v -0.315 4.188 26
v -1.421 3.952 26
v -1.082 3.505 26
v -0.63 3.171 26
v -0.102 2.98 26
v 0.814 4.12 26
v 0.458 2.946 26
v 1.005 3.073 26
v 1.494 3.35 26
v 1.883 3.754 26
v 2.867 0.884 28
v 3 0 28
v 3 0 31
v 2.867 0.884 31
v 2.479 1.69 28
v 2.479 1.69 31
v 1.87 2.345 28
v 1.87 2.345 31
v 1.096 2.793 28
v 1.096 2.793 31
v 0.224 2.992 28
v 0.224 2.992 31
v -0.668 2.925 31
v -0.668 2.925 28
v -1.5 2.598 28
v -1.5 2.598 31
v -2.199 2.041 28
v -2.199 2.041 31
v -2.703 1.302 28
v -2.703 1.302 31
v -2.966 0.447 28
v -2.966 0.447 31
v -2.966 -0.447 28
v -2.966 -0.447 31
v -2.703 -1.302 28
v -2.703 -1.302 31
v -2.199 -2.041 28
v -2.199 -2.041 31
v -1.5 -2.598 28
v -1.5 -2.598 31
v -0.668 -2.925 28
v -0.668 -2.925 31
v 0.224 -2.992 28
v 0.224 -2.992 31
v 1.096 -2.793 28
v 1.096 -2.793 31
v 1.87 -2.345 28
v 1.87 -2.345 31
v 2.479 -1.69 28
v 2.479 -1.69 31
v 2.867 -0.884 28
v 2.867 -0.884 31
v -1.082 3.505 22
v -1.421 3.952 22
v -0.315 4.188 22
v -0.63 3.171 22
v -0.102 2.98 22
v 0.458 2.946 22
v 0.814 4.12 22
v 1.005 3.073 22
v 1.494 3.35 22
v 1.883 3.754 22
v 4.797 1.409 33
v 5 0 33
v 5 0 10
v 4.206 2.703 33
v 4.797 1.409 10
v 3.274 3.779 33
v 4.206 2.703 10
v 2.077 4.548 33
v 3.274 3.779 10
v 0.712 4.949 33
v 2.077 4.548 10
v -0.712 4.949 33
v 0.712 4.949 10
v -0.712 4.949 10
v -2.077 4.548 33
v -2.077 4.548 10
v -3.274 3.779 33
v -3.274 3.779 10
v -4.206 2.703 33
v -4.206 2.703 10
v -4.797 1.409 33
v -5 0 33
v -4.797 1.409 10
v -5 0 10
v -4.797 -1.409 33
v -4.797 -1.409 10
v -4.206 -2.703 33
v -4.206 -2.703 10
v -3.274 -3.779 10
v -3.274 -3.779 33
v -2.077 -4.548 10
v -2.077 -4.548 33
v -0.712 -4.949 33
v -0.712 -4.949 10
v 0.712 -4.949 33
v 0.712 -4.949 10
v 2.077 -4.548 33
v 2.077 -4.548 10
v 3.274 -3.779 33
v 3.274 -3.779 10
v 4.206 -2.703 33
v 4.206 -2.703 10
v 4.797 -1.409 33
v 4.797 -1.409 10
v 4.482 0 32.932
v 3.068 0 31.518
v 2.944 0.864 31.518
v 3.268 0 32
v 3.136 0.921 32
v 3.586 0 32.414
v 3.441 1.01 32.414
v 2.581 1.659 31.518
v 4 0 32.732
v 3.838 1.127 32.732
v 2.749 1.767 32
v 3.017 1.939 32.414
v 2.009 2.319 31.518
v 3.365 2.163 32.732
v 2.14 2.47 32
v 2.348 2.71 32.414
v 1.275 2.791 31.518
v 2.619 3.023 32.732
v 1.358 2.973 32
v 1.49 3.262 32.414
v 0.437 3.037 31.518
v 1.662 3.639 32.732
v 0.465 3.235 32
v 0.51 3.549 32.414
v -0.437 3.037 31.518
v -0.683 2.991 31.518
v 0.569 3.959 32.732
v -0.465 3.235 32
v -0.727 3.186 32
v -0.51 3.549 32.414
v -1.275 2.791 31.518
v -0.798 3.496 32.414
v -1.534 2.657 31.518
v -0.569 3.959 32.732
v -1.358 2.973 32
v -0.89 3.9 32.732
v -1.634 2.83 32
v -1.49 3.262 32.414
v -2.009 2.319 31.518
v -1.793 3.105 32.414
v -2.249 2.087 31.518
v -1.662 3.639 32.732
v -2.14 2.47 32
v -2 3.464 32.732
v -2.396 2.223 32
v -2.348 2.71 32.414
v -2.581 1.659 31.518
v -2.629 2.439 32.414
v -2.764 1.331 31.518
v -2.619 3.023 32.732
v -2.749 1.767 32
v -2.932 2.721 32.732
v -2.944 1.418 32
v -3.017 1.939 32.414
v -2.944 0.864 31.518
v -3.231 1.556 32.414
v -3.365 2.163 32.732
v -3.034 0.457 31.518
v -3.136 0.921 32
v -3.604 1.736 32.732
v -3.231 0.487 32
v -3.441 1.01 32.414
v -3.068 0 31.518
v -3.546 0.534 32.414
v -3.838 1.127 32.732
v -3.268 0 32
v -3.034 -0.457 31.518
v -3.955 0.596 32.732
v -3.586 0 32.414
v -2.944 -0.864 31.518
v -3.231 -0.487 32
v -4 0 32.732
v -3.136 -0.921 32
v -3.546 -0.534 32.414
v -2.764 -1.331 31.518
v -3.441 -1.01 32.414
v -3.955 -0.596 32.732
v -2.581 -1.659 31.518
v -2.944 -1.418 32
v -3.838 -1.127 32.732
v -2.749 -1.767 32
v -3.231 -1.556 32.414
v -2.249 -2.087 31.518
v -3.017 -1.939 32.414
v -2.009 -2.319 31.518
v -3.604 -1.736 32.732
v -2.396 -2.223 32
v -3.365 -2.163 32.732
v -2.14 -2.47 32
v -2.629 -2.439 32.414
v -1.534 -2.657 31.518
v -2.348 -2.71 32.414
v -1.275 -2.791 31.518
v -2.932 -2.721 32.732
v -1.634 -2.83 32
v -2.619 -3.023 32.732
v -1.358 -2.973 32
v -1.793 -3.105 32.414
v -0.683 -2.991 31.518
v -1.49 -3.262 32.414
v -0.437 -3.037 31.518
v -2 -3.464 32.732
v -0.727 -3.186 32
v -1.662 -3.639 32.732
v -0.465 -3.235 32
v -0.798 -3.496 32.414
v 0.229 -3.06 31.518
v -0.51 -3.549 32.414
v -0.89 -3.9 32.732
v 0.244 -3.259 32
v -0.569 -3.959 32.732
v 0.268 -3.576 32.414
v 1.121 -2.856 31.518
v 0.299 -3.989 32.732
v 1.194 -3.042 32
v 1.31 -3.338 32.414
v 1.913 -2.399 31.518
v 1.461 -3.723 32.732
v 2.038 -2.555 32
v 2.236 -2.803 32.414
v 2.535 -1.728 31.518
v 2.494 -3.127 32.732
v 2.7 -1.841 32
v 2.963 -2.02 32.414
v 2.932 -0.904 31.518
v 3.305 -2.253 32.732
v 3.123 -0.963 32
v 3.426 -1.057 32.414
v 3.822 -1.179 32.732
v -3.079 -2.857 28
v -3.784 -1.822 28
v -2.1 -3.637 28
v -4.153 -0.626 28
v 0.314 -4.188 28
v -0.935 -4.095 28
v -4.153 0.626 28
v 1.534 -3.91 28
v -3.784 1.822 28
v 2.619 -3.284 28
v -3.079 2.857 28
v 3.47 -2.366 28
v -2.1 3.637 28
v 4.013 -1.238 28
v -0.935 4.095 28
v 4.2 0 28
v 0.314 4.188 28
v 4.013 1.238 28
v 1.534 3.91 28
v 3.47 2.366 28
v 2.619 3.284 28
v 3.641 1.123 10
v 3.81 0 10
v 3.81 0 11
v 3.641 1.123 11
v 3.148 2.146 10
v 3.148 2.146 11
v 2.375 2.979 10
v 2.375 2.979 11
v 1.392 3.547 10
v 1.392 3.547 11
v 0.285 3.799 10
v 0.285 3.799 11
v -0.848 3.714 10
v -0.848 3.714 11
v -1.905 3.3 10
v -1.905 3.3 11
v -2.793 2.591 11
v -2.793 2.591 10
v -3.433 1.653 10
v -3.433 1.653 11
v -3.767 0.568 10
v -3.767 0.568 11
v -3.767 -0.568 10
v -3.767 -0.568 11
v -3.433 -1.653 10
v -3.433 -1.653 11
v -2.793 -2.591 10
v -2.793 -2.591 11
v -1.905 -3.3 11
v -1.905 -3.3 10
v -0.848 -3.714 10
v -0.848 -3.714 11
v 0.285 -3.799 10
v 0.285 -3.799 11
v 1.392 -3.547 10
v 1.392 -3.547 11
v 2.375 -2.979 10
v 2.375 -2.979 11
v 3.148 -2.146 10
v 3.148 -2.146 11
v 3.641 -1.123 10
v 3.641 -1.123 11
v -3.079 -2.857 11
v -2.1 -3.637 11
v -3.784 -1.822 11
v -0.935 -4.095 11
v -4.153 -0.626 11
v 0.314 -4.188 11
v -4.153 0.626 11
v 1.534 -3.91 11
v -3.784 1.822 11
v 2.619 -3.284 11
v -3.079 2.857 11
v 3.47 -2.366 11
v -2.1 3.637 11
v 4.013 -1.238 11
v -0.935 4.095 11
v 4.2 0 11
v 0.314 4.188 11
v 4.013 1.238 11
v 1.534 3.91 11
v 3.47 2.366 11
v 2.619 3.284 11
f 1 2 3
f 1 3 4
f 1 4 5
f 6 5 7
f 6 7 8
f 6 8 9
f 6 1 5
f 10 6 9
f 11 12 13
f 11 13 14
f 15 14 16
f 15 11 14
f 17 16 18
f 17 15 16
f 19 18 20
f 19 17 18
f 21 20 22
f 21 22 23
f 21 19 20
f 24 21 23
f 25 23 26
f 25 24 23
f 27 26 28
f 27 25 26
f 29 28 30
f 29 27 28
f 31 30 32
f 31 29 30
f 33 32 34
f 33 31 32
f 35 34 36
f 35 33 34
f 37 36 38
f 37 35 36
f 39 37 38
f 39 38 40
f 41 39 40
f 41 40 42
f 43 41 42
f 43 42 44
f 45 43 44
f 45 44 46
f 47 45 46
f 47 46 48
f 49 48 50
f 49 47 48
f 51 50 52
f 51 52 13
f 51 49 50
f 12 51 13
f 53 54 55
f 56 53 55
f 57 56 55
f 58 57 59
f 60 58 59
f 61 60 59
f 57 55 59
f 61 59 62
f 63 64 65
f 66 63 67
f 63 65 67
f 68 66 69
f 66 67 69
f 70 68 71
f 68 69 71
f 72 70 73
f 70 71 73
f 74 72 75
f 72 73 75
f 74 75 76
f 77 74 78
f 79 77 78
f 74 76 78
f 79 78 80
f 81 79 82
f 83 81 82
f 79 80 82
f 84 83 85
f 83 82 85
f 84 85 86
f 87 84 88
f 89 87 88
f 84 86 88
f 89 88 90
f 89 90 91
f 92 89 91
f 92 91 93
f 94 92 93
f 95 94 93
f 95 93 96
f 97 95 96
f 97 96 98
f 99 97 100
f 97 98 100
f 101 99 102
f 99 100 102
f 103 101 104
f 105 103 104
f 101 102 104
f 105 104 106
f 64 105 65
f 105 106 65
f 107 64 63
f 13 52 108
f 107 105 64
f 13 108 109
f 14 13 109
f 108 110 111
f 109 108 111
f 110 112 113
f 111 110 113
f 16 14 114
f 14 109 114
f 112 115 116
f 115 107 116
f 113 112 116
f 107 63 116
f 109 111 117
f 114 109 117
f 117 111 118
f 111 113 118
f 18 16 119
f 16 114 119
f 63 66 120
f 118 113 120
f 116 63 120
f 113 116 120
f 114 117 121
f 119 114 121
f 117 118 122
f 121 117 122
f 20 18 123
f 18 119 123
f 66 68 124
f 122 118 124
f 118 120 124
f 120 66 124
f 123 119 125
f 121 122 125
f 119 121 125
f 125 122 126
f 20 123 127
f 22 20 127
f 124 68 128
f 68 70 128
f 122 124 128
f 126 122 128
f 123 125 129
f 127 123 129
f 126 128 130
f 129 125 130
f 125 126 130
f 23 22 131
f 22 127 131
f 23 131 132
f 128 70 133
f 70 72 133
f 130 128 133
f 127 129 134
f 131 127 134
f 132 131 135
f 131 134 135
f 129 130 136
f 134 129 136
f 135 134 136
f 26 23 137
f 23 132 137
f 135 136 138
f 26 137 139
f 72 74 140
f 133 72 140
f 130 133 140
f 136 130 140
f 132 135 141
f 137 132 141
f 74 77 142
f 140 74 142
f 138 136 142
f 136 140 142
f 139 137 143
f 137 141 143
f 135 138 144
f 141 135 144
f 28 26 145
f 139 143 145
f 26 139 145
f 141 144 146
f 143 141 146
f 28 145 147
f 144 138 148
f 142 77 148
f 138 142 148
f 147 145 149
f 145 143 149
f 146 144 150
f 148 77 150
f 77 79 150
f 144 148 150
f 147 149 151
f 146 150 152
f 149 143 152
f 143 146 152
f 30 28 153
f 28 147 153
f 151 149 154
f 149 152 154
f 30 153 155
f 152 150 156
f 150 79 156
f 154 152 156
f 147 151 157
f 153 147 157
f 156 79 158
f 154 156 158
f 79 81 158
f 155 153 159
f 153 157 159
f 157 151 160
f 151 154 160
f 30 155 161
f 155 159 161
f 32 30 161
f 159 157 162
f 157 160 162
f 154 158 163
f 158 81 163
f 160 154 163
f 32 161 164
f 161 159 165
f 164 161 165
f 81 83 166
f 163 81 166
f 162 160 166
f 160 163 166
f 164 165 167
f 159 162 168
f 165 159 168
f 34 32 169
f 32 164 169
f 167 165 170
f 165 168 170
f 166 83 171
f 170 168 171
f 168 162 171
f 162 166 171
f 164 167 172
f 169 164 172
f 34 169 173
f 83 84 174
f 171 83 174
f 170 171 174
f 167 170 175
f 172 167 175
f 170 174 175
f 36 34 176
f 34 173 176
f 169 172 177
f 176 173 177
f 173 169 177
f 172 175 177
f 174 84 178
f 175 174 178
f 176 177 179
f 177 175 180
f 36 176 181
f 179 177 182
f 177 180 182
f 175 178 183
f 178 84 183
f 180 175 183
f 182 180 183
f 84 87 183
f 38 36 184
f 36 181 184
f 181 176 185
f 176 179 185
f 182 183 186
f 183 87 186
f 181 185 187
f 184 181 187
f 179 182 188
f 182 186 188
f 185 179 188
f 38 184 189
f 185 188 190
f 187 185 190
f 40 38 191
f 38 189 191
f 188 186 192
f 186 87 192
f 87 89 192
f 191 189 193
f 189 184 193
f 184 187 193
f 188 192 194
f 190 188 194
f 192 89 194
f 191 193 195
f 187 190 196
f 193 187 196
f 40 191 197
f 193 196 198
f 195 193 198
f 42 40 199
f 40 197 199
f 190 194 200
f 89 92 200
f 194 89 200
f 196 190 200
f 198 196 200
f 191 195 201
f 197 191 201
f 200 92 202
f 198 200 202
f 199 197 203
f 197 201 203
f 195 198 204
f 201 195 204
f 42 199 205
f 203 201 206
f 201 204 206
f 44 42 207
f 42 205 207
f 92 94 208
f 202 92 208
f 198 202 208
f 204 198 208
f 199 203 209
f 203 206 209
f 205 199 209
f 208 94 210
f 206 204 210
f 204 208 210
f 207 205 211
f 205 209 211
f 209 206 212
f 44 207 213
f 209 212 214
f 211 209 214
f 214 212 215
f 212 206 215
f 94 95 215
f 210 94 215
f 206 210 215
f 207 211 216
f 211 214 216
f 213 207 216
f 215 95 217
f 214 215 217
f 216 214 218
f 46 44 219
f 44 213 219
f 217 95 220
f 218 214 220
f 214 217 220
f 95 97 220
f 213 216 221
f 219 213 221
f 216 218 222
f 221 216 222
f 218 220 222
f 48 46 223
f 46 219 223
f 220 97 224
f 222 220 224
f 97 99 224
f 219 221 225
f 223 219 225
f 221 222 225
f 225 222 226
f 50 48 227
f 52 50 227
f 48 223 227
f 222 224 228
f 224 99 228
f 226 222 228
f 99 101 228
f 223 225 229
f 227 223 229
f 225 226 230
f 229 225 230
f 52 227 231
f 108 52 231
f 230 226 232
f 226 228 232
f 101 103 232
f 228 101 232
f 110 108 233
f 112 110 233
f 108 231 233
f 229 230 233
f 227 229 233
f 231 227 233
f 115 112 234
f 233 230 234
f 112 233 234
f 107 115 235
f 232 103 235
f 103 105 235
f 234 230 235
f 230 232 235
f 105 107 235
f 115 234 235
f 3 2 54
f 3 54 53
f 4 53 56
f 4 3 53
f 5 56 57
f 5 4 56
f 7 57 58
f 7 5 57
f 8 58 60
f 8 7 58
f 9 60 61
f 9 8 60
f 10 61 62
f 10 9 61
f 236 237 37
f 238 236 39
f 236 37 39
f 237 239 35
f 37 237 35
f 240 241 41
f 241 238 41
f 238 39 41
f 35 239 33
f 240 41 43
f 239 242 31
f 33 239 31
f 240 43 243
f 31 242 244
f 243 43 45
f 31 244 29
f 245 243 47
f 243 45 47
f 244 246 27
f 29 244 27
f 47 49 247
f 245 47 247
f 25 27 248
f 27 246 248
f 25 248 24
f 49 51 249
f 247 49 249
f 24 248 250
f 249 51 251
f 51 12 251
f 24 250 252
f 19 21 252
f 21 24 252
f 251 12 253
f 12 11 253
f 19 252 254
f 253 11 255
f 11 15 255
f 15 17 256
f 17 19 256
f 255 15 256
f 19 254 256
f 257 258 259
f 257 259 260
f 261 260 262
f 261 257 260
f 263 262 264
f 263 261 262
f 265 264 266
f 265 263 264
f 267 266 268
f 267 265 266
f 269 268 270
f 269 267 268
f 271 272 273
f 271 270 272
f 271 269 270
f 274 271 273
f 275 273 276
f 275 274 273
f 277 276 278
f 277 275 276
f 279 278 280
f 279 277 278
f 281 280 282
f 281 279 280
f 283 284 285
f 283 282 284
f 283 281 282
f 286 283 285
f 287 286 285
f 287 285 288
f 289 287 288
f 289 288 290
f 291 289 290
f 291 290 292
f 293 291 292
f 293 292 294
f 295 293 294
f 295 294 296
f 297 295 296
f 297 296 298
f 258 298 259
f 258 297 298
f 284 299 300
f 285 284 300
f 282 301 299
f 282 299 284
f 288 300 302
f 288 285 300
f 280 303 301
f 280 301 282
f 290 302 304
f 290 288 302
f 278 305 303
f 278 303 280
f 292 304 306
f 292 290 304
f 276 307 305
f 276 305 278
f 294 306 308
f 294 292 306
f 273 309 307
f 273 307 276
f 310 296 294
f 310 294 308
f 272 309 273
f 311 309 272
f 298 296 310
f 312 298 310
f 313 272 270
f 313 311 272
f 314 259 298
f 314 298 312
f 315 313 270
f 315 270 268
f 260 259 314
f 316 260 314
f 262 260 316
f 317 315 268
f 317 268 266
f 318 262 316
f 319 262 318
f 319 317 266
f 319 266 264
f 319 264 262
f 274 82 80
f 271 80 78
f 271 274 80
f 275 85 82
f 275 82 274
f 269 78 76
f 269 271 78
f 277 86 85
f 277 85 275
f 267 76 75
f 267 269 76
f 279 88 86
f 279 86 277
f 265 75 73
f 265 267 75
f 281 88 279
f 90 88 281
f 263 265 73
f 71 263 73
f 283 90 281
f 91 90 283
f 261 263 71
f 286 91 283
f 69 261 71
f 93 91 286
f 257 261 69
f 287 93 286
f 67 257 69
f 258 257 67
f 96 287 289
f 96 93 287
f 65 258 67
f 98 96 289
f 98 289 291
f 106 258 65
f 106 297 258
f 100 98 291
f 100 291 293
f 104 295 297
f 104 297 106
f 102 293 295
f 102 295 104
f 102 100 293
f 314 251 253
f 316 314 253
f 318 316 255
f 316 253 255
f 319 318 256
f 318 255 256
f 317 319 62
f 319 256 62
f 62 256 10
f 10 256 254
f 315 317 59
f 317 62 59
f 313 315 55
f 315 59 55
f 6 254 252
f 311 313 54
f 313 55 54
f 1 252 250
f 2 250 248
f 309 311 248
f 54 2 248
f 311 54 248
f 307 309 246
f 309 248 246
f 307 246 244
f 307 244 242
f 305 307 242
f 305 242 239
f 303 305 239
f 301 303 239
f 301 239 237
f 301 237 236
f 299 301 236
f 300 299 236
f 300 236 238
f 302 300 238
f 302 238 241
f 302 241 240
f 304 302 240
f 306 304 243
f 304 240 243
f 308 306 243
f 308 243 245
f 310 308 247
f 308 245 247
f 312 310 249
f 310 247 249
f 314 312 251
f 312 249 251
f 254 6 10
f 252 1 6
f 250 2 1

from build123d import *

# Parameters (mm, degrees)
F0_R      = 5
F0_R_2    = 3.81
F1_DEPTH  = 28
F3_R      = 4.2
F4_DEPTH  = 10
F5_R      = 6.6272432787
F6_DEPTH  = 10
F2_R      = 4.2
F7_DEPTH  = 17
F9_DEPTH  = 6
F10_R     = 4.2
F11_DEPTH = 2
F12_R     = 5
F12_R_2   = 3
F13_DEPTH = 5
F14_R     = 1.99999


# Not quite as in the source:
# - a fillet or chamfer is up to 0.001 mm smaller than in the source, because OpenCascade refuses the exact size


with BuildPart() as f1:
    # F0 (on Top) → F1 (new body)
    with BuildSketch(Plane.XY):
        Circle(F0_R)
        Circle(F0_R_2, mode=Mode.SUBTRACT)
    extrude(amount=F1_DEPTH)

    # F3 (on face) → F4 (cut)
    with BuildSketch(Plane(origin=(0, 0, 0), x_dir=(1, 0, 0), z_dir=(0, 0, -1))):
        with Locations((0.1565692156, 0)):
            Circle(F3_R)
    extrude(amount=-F4_DEPTH, mode=Mode.SUBTRACT)

    # F5 (on face) → F6 (cut)
    with BuildSketch(Plane(origin=(0, 0, 0), x_dir=(1, 0, 0), z_dir=(0, 0, -1))):
        with Locations((-0.2925955923, 0)):
            Circle(F5_R)
    extrude(amount=-F6_DEPTH, mode=Mode.SUBTRACT)

    # F2 (on face) → F7 (cut)
    with BuildSketch(Plane.XY.offset(28)):
        Circle(F2_R)
    extrude(amount=-F7_DEPTH, mode=Mode.SUBTRACT)

    # F8 (on face) → F9 (join)
    with BuildSketch(Plane.XY.offset(28)):
        with BuildLine():
            ThreePointArc((1.8834823008, 3.7539971261), (0.2542086961, 4.2354191199), (-1.4209507588, 3.9523282937))
            ThreePointArc((-1.4209507588, 3.9523282937), (0.1766375517, 2.9429916253), (1.8834823008, 3.7539971261))
        make_face()
    extrude(amount=-F9_DEPTH)

    # F10 (on face) → F11 (cut)
    with BuildSketch(Plane.XY.offset(28)):
        Circle(F10_R)
    extrude(amount=-F11_DEPTH, mode=Mode.SUBTRACT)

    # F12 (on face) → F13 (join)
    with BuildSketch(Plane.XY.offset(28)):
        Circle(F12_R)
        Circle(F12_R_2, mode=Mode.SUBTRACT)
    extrude(amount=F13_DEPTH)

    # F14 (radius 2 in the source; OpenCascade refuses exactly that, so slightly less here)
    f14_edges = [f1.edges().sort_by_distance(p)[0] for p in [
        (-3, 0, 33),
    ]]
    fillet(f14_edges, radius=F14_R)


solid = f1.part
